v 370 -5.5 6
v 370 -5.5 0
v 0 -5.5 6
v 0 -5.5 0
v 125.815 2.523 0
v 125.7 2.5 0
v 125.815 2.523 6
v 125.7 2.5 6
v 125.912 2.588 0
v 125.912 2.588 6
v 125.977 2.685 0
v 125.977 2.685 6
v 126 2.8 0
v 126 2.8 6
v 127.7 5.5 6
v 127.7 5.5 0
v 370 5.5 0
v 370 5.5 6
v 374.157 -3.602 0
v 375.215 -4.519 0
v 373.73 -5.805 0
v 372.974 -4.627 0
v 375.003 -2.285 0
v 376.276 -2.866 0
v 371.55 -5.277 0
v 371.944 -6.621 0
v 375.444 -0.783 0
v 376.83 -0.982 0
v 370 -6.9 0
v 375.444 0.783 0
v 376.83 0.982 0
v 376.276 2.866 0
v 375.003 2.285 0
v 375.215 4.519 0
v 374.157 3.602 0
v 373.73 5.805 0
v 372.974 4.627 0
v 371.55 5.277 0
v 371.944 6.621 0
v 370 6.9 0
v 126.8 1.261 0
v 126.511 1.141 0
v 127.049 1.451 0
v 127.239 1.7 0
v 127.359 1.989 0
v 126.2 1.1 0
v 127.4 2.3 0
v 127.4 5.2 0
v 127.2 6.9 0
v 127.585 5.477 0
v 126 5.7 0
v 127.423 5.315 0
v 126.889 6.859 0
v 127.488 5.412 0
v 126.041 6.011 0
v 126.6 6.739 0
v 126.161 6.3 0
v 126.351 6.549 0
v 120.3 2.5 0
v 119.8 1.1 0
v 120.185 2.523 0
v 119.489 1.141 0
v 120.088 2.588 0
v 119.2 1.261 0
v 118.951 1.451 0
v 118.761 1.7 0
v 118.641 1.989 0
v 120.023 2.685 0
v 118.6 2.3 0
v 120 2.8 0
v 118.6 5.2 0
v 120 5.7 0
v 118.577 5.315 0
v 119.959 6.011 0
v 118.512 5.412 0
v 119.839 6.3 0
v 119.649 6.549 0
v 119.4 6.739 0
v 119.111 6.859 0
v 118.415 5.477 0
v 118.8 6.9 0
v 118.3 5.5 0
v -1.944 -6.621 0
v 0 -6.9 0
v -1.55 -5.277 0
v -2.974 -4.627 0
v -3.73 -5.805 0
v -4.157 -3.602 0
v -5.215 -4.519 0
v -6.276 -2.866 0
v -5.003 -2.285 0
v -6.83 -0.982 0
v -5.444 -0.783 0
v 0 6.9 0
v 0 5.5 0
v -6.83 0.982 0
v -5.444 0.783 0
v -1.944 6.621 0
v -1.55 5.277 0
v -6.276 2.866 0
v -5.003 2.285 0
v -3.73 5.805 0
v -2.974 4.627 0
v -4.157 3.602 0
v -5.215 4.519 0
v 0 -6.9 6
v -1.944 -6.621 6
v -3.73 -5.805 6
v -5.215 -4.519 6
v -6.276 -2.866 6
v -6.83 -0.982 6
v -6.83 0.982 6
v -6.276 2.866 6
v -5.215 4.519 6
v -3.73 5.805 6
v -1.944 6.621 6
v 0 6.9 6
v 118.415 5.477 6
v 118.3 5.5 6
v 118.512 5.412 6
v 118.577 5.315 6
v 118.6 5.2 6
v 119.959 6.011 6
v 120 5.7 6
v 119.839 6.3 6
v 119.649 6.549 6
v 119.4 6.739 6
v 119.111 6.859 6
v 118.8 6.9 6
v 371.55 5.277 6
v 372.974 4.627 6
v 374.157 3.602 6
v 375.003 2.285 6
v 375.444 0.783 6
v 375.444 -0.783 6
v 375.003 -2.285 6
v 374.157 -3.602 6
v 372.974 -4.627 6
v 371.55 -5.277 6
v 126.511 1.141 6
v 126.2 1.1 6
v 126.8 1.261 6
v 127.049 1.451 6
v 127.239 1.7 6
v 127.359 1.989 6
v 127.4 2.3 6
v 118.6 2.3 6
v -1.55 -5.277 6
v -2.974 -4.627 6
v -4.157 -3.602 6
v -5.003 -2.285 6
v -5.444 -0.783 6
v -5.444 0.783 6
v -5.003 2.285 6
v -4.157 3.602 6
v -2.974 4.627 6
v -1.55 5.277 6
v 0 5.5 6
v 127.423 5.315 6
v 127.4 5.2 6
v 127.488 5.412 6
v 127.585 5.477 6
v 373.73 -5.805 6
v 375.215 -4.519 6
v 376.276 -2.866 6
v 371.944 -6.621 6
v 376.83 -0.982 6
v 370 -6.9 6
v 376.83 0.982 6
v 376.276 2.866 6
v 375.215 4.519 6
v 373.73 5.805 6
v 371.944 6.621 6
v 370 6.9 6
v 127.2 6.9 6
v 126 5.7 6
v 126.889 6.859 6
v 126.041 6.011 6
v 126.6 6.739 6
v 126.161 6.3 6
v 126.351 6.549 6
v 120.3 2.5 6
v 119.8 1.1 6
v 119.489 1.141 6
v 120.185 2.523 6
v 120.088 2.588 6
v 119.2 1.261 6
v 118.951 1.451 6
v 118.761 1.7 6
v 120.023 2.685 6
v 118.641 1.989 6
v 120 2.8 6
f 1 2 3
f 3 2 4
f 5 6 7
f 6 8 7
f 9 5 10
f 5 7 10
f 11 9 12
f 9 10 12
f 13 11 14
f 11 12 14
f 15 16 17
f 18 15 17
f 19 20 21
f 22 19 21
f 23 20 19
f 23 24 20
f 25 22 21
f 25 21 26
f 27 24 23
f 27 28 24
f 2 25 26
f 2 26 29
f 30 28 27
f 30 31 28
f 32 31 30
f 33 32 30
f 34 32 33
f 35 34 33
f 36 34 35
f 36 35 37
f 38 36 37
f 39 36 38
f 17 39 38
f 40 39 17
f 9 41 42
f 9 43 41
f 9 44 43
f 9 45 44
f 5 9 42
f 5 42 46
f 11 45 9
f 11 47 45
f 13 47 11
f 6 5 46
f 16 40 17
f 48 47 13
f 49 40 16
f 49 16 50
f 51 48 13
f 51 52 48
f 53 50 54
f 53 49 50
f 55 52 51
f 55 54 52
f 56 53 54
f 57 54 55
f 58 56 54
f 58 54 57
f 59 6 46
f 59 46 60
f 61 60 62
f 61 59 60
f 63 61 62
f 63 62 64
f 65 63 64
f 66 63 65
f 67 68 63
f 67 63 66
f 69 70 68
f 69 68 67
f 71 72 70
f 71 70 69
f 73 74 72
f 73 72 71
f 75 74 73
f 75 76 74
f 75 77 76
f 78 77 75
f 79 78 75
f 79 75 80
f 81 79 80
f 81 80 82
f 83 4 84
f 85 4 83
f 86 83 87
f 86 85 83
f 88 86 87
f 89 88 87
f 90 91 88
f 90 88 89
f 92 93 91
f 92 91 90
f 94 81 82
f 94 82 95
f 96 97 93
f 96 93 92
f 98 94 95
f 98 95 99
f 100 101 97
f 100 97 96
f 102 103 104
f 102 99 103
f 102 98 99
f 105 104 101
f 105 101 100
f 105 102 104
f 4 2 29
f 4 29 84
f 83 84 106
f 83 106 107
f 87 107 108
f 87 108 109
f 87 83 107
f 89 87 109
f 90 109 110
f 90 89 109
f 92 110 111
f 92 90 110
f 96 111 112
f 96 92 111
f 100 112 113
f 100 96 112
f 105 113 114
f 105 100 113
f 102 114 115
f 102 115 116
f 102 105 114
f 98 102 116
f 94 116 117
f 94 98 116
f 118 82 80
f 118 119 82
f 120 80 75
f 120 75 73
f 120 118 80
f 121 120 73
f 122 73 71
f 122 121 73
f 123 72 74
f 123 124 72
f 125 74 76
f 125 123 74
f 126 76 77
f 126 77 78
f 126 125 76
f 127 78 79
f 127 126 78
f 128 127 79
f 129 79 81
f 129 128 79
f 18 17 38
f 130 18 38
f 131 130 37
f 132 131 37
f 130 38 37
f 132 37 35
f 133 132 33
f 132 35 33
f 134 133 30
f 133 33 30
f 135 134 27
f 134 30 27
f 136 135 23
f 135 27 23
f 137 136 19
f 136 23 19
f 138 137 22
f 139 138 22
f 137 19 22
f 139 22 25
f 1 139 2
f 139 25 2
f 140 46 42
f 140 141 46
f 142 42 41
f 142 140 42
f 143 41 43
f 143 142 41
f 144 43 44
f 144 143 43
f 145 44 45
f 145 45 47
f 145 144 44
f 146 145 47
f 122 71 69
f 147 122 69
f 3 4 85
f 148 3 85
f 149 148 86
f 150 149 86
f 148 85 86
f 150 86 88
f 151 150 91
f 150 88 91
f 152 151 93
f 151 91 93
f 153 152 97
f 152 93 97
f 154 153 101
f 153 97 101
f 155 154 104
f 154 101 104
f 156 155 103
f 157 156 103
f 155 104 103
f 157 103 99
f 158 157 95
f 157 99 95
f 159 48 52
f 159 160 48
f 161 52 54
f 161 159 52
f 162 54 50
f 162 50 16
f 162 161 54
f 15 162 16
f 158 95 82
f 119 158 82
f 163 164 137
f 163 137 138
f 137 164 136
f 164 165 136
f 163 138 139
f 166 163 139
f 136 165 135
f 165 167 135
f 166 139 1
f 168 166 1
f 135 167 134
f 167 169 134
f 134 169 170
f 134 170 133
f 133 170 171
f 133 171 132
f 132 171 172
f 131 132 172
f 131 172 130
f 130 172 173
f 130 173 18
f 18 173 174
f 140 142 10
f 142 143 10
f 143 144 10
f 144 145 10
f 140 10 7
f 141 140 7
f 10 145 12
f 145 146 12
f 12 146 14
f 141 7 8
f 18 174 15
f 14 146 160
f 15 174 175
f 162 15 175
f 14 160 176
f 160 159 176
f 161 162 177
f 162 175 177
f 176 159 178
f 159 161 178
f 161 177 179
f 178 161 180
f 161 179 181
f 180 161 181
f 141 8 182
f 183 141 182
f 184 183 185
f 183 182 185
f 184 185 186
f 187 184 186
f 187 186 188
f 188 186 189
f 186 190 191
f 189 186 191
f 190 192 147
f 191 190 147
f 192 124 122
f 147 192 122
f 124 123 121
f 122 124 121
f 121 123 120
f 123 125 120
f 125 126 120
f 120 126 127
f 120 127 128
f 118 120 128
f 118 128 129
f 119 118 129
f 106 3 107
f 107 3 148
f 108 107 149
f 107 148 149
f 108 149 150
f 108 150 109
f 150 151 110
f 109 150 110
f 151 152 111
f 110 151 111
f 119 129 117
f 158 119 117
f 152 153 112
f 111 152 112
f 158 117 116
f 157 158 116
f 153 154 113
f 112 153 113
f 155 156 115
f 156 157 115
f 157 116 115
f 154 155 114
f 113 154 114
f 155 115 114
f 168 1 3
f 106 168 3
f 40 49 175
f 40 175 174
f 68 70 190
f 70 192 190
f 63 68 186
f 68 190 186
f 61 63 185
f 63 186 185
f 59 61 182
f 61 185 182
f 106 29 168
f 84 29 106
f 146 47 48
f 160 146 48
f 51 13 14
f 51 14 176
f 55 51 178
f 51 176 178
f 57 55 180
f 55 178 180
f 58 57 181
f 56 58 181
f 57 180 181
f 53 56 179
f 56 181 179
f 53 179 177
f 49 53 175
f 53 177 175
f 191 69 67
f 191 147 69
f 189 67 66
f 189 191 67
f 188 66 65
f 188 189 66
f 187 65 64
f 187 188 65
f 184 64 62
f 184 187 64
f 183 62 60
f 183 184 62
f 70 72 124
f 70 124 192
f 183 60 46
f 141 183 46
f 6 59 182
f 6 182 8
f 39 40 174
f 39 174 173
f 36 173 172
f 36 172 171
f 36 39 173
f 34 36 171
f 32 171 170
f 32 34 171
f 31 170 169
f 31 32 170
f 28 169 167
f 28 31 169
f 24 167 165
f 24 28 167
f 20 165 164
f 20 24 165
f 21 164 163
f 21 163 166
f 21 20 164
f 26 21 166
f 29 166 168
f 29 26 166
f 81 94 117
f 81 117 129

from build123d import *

# Parameters (mm, degrees)
SALIENTE_EXTRUIR1_DEPTH = 6
REDONDEO1_R             = 0.3
REDONDEO2_R             = 1.2


with BuildPart() as part:
    # Croquis1 → Saliente-Extruir1 (new body)
    with BuildSketch(Plane.XY):
        with BuildLine():
            Line((0, 6.9), (120, 6.9))
            Line((120, 6.9), (120, 2.5))
            Line((120, 2.5), (126, 2.5))
            Line((126, 2.5), (126, 6.9))
            Line((126, 6.9), (370, 6.9))
            ThreePointArc((370, 6.9), (376.9, 0), (370, -6.9))
            Line((370, -6.9), (0, -6.9))
            ThreePointArc((0, -6.9), (-6.9, 0), (0, 6.9))
        make_face()
        with BuildLine():
            Line((0, 5.5), (118.6, 5.5))
            Line((118.6, 5.5), (118.6, 1.1))
            Line((118.6, 1.1), (127.4, 1.1))
            Line((127.4, 1.1), (127.4, 5.5))
            Line((127.4, 5.5), (370, 5.5))
            ThreePointArc((370, 5.5), (375.5, 0), (370, -5.5))
            Line((370, -5.5), (0, -5.5))
            ThreePointArc((0, -5.5), (-5.5, 0), (0, 5.5))
        make_face(mode=Mode.SUBTRACT)
    extrude(amount=SALIENTE_EXTRUIR1_DEPTH)

    # Redondeo1
    redondeo1_edges = [part.edges().sort_by_distance(p)[0] for p in [
        (120, 2.5, 3),
        (126, 2.5, 3),
        (127.4, 5.5, 3),
        (118.6, 5.5, 3),
    ]]
    fillet(redondeo1_edges, radius=REDONDEO1_R)

    # Redondeo2
    redondeo2_edges = [part.edges().sort_by_distance(p)[0] for p in [
        (120, 6.9, 3),
        (126, 6.9, 3),
        (127.4, 1.1, 3),
        (118.6, 1.1, 3),
    ]]
    fillet(redondeo2_edges, radius=REDONDEO2_R)


solid = part.part
